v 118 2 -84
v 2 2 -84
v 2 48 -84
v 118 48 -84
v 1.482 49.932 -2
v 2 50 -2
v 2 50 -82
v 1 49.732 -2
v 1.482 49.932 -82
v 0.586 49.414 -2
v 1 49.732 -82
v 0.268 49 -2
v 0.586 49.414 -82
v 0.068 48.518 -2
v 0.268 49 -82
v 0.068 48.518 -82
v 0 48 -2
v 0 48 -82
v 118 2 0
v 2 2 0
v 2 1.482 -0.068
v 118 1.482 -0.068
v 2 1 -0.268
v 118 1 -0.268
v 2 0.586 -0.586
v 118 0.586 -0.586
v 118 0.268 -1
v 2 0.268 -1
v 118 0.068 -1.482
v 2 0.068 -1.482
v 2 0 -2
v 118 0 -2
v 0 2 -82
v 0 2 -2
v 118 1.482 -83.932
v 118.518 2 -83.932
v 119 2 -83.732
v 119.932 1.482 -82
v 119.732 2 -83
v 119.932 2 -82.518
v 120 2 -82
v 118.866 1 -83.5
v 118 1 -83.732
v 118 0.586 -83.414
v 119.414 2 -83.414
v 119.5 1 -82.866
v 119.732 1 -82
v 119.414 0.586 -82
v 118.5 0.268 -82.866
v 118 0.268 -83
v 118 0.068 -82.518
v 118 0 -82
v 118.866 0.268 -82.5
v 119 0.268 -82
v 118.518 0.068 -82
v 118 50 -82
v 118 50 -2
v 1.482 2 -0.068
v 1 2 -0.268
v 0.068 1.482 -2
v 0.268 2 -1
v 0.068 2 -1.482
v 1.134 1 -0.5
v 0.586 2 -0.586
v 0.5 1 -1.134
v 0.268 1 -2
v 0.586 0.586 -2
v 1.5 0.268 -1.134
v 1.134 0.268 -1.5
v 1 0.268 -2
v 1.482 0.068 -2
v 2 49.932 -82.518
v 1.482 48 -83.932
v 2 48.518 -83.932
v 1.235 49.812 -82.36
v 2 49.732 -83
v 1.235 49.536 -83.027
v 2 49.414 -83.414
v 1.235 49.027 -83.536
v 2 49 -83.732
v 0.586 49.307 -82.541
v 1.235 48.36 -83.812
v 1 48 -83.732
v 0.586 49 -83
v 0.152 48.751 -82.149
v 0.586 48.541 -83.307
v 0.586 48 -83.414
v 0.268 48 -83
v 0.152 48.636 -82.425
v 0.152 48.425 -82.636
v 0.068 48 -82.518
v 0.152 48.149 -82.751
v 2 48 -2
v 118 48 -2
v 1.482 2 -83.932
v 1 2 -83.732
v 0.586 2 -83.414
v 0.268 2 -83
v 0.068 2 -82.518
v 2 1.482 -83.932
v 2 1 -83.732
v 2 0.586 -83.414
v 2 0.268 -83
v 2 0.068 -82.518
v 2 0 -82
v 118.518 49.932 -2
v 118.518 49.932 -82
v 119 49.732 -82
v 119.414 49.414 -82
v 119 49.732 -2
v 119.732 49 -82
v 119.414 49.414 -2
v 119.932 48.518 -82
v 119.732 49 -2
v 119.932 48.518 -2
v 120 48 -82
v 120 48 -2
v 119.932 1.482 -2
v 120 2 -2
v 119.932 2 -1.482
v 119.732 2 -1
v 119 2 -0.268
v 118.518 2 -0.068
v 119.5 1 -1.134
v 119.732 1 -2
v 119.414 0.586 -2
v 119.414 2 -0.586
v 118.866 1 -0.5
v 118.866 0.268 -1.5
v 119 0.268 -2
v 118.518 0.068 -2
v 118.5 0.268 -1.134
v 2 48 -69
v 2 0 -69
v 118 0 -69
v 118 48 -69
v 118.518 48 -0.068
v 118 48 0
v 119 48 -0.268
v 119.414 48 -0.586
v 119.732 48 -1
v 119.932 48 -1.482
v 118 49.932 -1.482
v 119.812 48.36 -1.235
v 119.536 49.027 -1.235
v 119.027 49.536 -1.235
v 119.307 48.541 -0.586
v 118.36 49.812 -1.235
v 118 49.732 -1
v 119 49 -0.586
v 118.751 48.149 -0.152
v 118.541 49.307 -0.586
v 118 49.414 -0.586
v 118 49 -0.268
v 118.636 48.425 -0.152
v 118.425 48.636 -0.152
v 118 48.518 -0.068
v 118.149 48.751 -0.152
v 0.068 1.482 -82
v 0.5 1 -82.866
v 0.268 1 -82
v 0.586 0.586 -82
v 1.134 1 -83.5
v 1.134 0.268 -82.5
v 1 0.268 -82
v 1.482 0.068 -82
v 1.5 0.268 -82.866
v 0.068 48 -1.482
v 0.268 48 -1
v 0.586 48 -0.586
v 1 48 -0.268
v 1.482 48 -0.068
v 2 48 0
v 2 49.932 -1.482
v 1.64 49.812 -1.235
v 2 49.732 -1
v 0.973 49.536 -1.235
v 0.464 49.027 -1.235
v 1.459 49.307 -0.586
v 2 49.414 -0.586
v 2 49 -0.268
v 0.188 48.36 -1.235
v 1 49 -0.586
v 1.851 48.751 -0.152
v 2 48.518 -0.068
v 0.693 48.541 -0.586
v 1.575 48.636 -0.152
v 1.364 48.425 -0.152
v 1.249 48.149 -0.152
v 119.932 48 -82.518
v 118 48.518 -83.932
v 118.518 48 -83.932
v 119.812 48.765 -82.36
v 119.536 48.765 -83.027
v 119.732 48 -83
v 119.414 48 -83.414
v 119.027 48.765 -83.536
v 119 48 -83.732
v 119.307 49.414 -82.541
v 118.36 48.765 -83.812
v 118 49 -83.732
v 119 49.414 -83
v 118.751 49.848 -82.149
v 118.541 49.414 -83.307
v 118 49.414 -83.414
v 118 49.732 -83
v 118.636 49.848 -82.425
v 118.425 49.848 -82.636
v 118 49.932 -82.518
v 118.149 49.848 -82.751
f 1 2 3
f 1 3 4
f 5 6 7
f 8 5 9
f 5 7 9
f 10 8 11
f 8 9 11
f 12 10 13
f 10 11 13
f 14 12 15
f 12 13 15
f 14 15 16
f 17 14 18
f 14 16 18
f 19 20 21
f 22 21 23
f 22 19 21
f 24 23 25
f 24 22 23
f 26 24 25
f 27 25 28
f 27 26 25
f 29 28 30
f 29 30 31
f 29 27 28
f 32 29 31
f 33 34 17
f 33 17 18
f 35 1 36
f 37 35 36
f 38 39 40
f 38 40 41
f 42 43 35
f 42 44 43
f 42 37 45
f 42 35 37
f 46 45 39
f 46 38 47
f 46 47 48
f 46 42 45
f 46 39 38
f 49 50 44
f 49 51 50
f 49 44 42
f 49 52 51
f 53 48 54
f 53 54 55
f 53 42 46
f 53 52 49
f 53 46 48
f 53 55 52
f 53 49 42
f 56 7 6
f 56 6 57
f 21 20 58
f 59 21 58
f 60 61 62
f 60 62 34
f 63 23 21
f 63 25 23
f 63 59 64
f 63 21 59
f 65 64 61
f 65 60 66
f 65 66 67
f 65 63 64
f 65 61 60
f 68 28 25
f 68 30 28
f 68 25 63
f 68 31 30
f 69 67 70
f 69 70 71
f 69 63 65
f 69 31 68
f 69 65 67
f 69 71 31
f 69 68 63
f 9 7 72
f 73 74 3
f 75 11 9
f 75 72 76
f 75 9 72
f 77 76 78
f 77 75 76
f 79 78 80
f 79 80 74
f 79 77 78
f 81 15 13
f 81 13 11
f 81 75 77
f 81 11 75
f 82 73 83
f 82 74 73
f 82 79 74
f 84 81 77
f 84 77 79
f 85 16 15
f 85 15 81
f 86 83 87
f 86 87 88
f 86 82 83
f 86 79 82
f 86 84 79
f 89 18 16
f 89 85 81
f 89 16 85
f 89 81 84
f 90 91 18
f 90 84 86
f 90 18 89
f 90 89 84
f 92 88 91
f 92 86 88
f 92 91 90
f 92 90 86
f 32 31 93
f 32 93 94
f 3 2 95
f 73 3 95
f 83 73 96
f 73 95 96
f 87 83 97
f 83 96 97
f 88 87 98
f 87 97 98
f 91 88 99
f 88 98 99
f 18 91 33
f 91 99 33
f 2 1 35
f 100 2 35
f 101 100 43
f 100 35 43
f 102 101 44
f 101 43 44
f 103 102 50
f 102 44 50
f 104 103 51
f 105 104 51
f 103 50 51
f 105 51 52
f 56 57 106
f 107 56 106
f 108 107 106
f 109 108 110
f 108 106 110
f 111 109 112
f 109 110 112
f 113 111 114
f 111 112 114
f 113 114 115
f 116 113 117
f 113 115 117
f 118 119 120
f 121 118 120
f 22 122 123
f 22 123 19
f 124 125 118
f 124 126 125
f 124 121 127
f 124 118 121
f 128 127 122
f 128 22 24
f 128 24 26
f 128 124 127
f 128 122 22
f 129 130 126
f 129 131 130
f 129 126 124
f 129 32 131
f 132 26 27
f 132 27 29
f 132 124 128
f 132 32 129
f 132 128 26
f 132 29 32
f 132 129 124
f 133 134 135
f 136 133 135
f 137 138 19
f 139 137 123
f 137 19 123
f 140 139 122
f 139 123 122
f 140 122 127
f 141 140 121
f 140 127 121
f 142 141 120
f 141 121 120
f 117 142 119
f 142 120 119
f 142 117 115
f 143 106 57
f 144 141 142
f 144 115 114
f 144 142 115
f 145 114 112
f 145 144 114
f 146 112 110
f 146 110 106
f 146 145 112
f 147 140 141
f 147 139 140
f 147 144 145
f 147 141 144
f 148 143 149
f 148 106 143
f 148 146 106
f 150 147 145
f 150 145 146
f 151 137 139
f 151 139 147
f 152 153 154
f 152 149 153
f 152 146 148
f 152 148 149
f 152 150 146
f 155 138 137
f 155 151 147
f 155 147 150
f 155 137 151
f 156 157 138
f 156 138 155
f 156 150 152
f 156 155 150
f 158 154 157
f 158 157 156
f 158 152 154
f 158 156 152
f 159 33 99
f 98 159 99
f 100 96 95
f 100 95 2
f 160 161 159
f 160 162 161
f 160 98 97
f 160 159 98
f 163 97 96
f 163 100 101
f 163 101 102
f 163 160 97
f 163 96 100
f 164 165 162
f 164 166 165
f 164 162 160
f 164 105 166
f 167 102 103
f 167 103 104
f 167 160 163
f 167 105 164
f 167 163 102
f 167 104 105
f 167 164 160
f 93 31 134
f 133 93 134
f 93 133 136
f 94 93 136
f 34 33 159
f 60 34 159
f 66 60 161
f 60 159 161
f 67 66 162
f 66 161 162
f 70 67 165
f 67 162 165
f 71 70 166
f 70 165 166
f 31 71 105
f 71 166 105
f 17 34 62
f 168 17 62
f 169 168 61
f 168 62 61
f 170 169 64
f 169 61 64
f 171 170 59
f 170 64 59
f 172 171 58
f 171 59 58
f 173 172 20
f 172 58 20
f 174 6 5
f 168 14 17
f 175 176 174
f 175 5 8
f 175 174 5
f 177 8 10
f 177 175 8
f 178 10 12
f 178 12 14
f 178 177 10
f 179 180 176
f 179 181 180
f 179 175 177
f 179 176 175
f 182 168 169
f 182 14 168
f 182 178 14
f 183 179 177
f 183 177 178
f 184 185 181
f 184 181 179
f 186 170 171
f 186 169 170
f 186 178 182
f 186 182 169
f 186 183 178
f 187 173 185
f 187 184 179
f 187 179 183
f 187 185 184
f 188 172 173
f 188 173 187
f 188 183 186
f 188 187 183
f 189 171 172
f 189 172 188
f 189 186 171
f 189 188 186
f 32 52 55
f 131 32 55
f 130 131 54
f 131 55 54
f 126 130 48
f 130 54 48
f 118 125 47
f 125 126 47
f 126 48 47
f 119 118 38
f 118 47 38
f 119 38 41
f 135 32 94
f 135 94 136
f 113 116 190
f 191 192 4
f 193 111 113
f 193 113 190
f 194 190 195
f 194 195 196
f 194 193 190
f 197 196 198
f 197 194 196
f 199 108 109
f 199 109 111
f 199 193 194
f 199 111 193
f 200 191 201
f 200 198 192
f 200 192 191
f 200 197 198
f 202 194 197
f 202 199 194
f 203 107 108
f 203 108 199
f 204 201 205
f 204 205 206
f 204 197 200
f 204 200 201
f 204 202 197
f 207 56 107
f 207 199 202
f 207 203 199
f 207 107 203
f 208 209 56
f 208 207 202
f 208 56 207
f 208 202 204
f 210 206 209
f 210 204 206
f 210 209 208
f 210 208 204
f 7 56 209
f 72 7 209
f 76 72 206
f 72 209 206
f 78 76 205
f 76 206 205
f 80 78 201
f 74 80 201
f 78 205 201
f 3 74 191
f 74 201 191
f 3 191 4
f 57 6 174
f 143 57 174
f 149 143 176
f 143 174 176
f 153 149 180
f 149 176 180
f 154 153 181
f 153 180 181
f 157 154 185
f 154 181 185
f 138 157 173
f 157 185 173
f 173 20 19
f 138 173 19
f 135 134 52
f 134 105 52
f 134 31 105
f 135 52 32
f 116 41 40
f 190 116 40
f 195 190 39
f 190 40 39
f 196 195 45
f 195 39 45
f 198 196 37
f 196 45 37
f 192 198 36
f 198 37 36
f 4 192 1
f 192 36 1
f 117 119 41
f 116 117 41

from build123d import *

# Parameters (mm, degrees)
SKETCH4_W                = 120
SKETCH4_H                = 84
BOSS_EXTRUDE2_DEPTH      = 50
BOSS_EXTRUDE4_DEPTH      = 48
BOSS_EXTRUDE4_DEPTH_BACK = 5.717293385
SKETCH5_W                = 116
SKETCH5_H                = 67
FILLET2_R                = 2
FILLET3_R                = 2


# Some blends are built 0.0001 mm under size
with BuildPart() as part:
    # Sketch4 → Boss-Extrude2 (new body)
    with BuildSketch(Plane(origin=(0, 0, 0), x_dir=(1, 0, 0), z_dir=(0, 1, 0))):
        with Locations((60, 42)):
            Rectangle(SKETCH4_W, SKETCH4_H)
    extrude(amount=BOSS_EXTRUDE2_DEPTH)


with BuildPart() as body_2:
    # Sketch5 → Boss-Extrude4 (new, two sides: drawn at the far end of the back side and taken through both)
    with BuildSketch(Plane(origin=(0, 0, 0), x_dir=(1, 0, 0), z_dir=(0, 1, 0)).offset(-BOSS_EXTRUDE4_DEPTH_BACK)):
        with Locations((60, 35.5)):
            Rectangle(SKETCH5_W, SKETCH5_H)
    extrude(amount=BOSS_EXTRUDE4_DEPTH + BOSS_EXTRUDE4_DEPTH_BACK)


with BuildPart() as part_1:
    add(part.part)

    # Combine1: cut body 2
    add(body_2.part, mode=Mode.SUBTRACT)

    # Fillet2
    fillet2_edges = [part_1.edges().sort_by_distance(p)[0] for p in [
        (0, 0, -42),
        (60, 0, -84),
        (120, 0, -42),
        (60, 0, 0),
    ]]
    fillet(fillet2_edges, radius=FILLET2_R - 0.0001)  # a hair under: the kernel refuses the full size

    # Fillet3
    # the kernel refuses this fillet: 2 mm, written as the material it takes off along each edge
    with BuildSketch(Plane(origin=(118, 0, -2), x_dir=(1, 0, 0), z_dir=(0, 0, -1))) as fillet3_piece_1:
        with BuildLine():
            CenterArc((0.0001, -1.9999), 1.9999, 0, 90)
            Line((2, -1.9999), (2, 0))
            Line((2, 0), (0.0001, 0))
        make_face()
    revolve(axis=Axis((118, 0, -2), (0, -1, 0)), revolution_arc=90, mode=Mode.SUBTRACT)
    with BuildSketch(Plane(origin=(118, 0, -82), x_dir=(0, 0, -1), z_dir=(-1, 0, 0))) as fillet3_piece_2:
        with BuildLine():
            CenterArc((0.0001, -1.9999), 1.9999, 0, 90)
            Line((2, -1.9999), (2, 0))
            Line((2, 0), (0.0001, 0))
        make_face()
    revolve(axis=Axis((118, 0, -82), (0, -1, 0)), revolution_arc=90, mode=Mode.SUBTRACT)
    with BuildSketch(Plane(origin=(2, 0, -2), x_dir=(0, 0, 1), z_dir=(1, 0, 0))) as fillet3_piece_3:
        with BuildLine():
            CenterArc((0.0001, -1.9999), 1.9999, 0, 90)
            Line((2, -1.9999), (2, 0))
            Line((2, 0), (0.0001, 0))
        make_face()
    revolve(axis=Axis((2, 0, -2), (0, -1, 0)), revolution_arc=90, mode=Mode.SUBTRACT)
    with BuildSketch(Plane(origin=(2, 0, -82), x_dir=(-1, 0, 0), z_dir=(0, 0, 1))) as fillet3_piece_4:
        with BuildLine():
            CenterArc((0.0001, -1.9999), 1.9999, 0, 90)
            Line((2, -1.9999), (2, 0))
            Line((2, 0), (0.0001, 0))
        make_face()
    revolve(axis=Axis((2, 0, -82), (0, -1, 0)), revolution_arc=90, mode=Mode.SUBTRACT)
    with BuildSketch(Plane(origin=(118, 48, -82), x_dir=(1, 0, 0), z_dir=(0, 1, 0))) as fillet3_piece_5_section:
        Polygon((0, 0), (FILLET3_R, 0), (FILLET3_R, FILLET3_R), (0, FILLET3_R), align=None)
    fillet3_piece_5 = extrude(amount=FILLET3_R, mode=Mode.PRIVATE)
    fillet3_piece_5 = fillet3_piece_5 - Plane(origin=(118, 48, -82), x_dir=(-0.7071067811865475, 0, 0.7071067811865475), z_dir=(0, 1, 0)) * Sphere(FILLET3_R, mode=Mode.PRIVATE)
    add(fillet3_piece_5, mode=Mode.SUBTRACT)
    with BuildSketch(Plane(origin=(2, 48, -82), x_dir=(0, 1, 0), z_dir=(-1, 0, 0))) as fillet3_piece_6_section:
        Polygon((0, 0), (FILLET3_R, 0), (FILLET3_R, FILLET3_R), (0, FILLET3_R), align=None)
    fillet3_piece_6 = extrude(amount=FILLET3_R, mode=Mode.PRIVATE)
    fillet3_piece_6 = fillet3_piece_6 - Plane(origin=(2, 48, -82), x_dir=(0, -0.7071067811865475, 0.7071067811865475), z_dir=(-1, 0, 0)) * Sphere(FILLET3_R, mode=Mode.PRIVATE)
    add(fillet3_piece_6, mode=Mode.SUBTRACT)
    with BuildSketch(Plane(origin=(2, 48, -2), x_dir=(-1, 0, 0), z_dir=(0, 0, 1))) as fillet3_piece_7_section:
        Polygon((0, 0), (FILLET3_R, 0), (FILLET3_R, -FILLET3_R), (0, -FILLET3_R), align=None)
    fillet3_piece_7 = extrude(amount=FILLET3_R, mode=Mode.PRIVATE)
    fillet3_piece_7 = fillet3_piece_7 - Plane(origin=(2, 48, -2), x_dir=(0.7071067811865475, -0.7071067811865475, 0), z_dir=(0, 0, 1)) * Sphere(FILLET3_R, mode=Mode.PRIVATE)
    add(fillet3_piece_7, mode=Mode.SUBTRACT)
    with BuildSketch(Plane(origin=(118, 48, -2), x_dir=(0, 1, 0), z_dir=(0, 0, 1))) as fillet3_piece_8_section:
        Polygon((0, 0), (FILLET3_R, 0), (FILLET3_R, -FILLET3_R), (0, -FILLET3_R), align=None)
    fillet3_piece_8 = extrude(amount=FILLET3_R, mode=Mode.PRIVATE)
    fillet3_piece_8 = fillet3_piece_8 - Plane(origin=(118, 48, -2), x_dir=(-0.7071067811865475, -0.7071067811865475, 0), z_dir=(0, 0, 1)) * Sphere(FILLET3_R, mode=Mode.PRIVATE)
    add(fillet3_piece_8, mode=Mode.SUBTRACT)
    with BuildSketch(Plane(origin=(118, 50, -84), x_dir=(0, 0, 1), z_dir=(-1, 0, 0))) as fillet3_piece_9:
        with BuildLine():
            CenterArc((FILLET3_R, -FILLET3_R), FILLET3_R, 90, 90)
            Line((0, -FILLET3_R), (0, 0))
            Line((0, 0), (FILLET3_R, 0))
        make_face()
    extrude(amount=116, mode=Mode.SUBTRACT)
    with BuildSketch(Plane(origin=(0, 50, -82), x_dir=(0, -1, 0), z_dir=(0, 0, 1))) as fillet3_piece_10:
        with BuildLine():
            CenterArc((FILLET3_R, FILLET3_R), FILLET3_R, 180, 90)
            Line((0, FILLET3_R), (0, 0))
            Line((0, 0), (FILLET3_R, 0))
        make_face()
    extrude(amount=80, mode=Mode.SUBTRACT)
    with BuildSketch(Plane(origin=(2, 50, 0), x_dir=(0, -1, 0), z_dir=(1, 0, 0))) as fillet3_piece_11:
        with BuildLine():
            CenterArc((FILLET3_R, FILLET3_R), FILLET3_R, 180, 90)
            Line((0, FILLET3_R), (0, 0))
            Line((0, 0), (FILLET3_R, 0))
        make_face()
    extrude(amount=116, mode=Mode.SUBTRACT)
    with BuildSketch(Plane(origin=(0, 0, 0), x_dir=(1, 0, 0), z_dir=(0, 1, 0)), Plane(origin=(0, 0, -84), x_dir=(0, 0, 1), z_dir=(0, 1, 0))) as fillet3_piece_12:
        with BuildLine():
            CenterArc((FILLET3_R, FILLET3_R), FILLET3_R, 180, 90)
            Line((0, FILLET3_R), (0, 0))
            Line((0, 0), (FILLET3_R, 0))
        make_face()
    extrude(amount=48, mode=Mode.SUBTRACT)
    with BuildSketch(Plane(origin=(120, 0, -84), x_dir=(0, 0, 1), z_dir=(0, 1, 0)), Plane(origin=(120, 0, 0), x_dir=(-1, 0, 0), z_dir=(0, 1, 0))) as fillet3_piece_13:
        with BuildLine():
            CenterArc((FILLET3_R, -FILLET3_R), FILLET3_R, 90, 90)
            Line((0, -FILLET3_R), (0, 0))
            Line((0, 0), (FILLET3_R, 0))
        make_face()
    extrude(amount=48, mode=Mode.SUBTRACT)
    with BuildSketch(Plane(origin=(120, 50, -2), x_dir=(-1, 0, 0), z_dir=(0, 0, -1))) as fillet3_piece_14:
        with BuildLine():
            CenterArc((FILLET3_R, -FILLET3_R), FILLET3_R, 90, 90)
            Line((0, -FILLET3_R), (0, 0))
            Line((0, 0), (FILLET3_R, 0))
        make_face()
    extrude(amount=80, mode=Mode.SUBTRACT)


solid = part_1.part
